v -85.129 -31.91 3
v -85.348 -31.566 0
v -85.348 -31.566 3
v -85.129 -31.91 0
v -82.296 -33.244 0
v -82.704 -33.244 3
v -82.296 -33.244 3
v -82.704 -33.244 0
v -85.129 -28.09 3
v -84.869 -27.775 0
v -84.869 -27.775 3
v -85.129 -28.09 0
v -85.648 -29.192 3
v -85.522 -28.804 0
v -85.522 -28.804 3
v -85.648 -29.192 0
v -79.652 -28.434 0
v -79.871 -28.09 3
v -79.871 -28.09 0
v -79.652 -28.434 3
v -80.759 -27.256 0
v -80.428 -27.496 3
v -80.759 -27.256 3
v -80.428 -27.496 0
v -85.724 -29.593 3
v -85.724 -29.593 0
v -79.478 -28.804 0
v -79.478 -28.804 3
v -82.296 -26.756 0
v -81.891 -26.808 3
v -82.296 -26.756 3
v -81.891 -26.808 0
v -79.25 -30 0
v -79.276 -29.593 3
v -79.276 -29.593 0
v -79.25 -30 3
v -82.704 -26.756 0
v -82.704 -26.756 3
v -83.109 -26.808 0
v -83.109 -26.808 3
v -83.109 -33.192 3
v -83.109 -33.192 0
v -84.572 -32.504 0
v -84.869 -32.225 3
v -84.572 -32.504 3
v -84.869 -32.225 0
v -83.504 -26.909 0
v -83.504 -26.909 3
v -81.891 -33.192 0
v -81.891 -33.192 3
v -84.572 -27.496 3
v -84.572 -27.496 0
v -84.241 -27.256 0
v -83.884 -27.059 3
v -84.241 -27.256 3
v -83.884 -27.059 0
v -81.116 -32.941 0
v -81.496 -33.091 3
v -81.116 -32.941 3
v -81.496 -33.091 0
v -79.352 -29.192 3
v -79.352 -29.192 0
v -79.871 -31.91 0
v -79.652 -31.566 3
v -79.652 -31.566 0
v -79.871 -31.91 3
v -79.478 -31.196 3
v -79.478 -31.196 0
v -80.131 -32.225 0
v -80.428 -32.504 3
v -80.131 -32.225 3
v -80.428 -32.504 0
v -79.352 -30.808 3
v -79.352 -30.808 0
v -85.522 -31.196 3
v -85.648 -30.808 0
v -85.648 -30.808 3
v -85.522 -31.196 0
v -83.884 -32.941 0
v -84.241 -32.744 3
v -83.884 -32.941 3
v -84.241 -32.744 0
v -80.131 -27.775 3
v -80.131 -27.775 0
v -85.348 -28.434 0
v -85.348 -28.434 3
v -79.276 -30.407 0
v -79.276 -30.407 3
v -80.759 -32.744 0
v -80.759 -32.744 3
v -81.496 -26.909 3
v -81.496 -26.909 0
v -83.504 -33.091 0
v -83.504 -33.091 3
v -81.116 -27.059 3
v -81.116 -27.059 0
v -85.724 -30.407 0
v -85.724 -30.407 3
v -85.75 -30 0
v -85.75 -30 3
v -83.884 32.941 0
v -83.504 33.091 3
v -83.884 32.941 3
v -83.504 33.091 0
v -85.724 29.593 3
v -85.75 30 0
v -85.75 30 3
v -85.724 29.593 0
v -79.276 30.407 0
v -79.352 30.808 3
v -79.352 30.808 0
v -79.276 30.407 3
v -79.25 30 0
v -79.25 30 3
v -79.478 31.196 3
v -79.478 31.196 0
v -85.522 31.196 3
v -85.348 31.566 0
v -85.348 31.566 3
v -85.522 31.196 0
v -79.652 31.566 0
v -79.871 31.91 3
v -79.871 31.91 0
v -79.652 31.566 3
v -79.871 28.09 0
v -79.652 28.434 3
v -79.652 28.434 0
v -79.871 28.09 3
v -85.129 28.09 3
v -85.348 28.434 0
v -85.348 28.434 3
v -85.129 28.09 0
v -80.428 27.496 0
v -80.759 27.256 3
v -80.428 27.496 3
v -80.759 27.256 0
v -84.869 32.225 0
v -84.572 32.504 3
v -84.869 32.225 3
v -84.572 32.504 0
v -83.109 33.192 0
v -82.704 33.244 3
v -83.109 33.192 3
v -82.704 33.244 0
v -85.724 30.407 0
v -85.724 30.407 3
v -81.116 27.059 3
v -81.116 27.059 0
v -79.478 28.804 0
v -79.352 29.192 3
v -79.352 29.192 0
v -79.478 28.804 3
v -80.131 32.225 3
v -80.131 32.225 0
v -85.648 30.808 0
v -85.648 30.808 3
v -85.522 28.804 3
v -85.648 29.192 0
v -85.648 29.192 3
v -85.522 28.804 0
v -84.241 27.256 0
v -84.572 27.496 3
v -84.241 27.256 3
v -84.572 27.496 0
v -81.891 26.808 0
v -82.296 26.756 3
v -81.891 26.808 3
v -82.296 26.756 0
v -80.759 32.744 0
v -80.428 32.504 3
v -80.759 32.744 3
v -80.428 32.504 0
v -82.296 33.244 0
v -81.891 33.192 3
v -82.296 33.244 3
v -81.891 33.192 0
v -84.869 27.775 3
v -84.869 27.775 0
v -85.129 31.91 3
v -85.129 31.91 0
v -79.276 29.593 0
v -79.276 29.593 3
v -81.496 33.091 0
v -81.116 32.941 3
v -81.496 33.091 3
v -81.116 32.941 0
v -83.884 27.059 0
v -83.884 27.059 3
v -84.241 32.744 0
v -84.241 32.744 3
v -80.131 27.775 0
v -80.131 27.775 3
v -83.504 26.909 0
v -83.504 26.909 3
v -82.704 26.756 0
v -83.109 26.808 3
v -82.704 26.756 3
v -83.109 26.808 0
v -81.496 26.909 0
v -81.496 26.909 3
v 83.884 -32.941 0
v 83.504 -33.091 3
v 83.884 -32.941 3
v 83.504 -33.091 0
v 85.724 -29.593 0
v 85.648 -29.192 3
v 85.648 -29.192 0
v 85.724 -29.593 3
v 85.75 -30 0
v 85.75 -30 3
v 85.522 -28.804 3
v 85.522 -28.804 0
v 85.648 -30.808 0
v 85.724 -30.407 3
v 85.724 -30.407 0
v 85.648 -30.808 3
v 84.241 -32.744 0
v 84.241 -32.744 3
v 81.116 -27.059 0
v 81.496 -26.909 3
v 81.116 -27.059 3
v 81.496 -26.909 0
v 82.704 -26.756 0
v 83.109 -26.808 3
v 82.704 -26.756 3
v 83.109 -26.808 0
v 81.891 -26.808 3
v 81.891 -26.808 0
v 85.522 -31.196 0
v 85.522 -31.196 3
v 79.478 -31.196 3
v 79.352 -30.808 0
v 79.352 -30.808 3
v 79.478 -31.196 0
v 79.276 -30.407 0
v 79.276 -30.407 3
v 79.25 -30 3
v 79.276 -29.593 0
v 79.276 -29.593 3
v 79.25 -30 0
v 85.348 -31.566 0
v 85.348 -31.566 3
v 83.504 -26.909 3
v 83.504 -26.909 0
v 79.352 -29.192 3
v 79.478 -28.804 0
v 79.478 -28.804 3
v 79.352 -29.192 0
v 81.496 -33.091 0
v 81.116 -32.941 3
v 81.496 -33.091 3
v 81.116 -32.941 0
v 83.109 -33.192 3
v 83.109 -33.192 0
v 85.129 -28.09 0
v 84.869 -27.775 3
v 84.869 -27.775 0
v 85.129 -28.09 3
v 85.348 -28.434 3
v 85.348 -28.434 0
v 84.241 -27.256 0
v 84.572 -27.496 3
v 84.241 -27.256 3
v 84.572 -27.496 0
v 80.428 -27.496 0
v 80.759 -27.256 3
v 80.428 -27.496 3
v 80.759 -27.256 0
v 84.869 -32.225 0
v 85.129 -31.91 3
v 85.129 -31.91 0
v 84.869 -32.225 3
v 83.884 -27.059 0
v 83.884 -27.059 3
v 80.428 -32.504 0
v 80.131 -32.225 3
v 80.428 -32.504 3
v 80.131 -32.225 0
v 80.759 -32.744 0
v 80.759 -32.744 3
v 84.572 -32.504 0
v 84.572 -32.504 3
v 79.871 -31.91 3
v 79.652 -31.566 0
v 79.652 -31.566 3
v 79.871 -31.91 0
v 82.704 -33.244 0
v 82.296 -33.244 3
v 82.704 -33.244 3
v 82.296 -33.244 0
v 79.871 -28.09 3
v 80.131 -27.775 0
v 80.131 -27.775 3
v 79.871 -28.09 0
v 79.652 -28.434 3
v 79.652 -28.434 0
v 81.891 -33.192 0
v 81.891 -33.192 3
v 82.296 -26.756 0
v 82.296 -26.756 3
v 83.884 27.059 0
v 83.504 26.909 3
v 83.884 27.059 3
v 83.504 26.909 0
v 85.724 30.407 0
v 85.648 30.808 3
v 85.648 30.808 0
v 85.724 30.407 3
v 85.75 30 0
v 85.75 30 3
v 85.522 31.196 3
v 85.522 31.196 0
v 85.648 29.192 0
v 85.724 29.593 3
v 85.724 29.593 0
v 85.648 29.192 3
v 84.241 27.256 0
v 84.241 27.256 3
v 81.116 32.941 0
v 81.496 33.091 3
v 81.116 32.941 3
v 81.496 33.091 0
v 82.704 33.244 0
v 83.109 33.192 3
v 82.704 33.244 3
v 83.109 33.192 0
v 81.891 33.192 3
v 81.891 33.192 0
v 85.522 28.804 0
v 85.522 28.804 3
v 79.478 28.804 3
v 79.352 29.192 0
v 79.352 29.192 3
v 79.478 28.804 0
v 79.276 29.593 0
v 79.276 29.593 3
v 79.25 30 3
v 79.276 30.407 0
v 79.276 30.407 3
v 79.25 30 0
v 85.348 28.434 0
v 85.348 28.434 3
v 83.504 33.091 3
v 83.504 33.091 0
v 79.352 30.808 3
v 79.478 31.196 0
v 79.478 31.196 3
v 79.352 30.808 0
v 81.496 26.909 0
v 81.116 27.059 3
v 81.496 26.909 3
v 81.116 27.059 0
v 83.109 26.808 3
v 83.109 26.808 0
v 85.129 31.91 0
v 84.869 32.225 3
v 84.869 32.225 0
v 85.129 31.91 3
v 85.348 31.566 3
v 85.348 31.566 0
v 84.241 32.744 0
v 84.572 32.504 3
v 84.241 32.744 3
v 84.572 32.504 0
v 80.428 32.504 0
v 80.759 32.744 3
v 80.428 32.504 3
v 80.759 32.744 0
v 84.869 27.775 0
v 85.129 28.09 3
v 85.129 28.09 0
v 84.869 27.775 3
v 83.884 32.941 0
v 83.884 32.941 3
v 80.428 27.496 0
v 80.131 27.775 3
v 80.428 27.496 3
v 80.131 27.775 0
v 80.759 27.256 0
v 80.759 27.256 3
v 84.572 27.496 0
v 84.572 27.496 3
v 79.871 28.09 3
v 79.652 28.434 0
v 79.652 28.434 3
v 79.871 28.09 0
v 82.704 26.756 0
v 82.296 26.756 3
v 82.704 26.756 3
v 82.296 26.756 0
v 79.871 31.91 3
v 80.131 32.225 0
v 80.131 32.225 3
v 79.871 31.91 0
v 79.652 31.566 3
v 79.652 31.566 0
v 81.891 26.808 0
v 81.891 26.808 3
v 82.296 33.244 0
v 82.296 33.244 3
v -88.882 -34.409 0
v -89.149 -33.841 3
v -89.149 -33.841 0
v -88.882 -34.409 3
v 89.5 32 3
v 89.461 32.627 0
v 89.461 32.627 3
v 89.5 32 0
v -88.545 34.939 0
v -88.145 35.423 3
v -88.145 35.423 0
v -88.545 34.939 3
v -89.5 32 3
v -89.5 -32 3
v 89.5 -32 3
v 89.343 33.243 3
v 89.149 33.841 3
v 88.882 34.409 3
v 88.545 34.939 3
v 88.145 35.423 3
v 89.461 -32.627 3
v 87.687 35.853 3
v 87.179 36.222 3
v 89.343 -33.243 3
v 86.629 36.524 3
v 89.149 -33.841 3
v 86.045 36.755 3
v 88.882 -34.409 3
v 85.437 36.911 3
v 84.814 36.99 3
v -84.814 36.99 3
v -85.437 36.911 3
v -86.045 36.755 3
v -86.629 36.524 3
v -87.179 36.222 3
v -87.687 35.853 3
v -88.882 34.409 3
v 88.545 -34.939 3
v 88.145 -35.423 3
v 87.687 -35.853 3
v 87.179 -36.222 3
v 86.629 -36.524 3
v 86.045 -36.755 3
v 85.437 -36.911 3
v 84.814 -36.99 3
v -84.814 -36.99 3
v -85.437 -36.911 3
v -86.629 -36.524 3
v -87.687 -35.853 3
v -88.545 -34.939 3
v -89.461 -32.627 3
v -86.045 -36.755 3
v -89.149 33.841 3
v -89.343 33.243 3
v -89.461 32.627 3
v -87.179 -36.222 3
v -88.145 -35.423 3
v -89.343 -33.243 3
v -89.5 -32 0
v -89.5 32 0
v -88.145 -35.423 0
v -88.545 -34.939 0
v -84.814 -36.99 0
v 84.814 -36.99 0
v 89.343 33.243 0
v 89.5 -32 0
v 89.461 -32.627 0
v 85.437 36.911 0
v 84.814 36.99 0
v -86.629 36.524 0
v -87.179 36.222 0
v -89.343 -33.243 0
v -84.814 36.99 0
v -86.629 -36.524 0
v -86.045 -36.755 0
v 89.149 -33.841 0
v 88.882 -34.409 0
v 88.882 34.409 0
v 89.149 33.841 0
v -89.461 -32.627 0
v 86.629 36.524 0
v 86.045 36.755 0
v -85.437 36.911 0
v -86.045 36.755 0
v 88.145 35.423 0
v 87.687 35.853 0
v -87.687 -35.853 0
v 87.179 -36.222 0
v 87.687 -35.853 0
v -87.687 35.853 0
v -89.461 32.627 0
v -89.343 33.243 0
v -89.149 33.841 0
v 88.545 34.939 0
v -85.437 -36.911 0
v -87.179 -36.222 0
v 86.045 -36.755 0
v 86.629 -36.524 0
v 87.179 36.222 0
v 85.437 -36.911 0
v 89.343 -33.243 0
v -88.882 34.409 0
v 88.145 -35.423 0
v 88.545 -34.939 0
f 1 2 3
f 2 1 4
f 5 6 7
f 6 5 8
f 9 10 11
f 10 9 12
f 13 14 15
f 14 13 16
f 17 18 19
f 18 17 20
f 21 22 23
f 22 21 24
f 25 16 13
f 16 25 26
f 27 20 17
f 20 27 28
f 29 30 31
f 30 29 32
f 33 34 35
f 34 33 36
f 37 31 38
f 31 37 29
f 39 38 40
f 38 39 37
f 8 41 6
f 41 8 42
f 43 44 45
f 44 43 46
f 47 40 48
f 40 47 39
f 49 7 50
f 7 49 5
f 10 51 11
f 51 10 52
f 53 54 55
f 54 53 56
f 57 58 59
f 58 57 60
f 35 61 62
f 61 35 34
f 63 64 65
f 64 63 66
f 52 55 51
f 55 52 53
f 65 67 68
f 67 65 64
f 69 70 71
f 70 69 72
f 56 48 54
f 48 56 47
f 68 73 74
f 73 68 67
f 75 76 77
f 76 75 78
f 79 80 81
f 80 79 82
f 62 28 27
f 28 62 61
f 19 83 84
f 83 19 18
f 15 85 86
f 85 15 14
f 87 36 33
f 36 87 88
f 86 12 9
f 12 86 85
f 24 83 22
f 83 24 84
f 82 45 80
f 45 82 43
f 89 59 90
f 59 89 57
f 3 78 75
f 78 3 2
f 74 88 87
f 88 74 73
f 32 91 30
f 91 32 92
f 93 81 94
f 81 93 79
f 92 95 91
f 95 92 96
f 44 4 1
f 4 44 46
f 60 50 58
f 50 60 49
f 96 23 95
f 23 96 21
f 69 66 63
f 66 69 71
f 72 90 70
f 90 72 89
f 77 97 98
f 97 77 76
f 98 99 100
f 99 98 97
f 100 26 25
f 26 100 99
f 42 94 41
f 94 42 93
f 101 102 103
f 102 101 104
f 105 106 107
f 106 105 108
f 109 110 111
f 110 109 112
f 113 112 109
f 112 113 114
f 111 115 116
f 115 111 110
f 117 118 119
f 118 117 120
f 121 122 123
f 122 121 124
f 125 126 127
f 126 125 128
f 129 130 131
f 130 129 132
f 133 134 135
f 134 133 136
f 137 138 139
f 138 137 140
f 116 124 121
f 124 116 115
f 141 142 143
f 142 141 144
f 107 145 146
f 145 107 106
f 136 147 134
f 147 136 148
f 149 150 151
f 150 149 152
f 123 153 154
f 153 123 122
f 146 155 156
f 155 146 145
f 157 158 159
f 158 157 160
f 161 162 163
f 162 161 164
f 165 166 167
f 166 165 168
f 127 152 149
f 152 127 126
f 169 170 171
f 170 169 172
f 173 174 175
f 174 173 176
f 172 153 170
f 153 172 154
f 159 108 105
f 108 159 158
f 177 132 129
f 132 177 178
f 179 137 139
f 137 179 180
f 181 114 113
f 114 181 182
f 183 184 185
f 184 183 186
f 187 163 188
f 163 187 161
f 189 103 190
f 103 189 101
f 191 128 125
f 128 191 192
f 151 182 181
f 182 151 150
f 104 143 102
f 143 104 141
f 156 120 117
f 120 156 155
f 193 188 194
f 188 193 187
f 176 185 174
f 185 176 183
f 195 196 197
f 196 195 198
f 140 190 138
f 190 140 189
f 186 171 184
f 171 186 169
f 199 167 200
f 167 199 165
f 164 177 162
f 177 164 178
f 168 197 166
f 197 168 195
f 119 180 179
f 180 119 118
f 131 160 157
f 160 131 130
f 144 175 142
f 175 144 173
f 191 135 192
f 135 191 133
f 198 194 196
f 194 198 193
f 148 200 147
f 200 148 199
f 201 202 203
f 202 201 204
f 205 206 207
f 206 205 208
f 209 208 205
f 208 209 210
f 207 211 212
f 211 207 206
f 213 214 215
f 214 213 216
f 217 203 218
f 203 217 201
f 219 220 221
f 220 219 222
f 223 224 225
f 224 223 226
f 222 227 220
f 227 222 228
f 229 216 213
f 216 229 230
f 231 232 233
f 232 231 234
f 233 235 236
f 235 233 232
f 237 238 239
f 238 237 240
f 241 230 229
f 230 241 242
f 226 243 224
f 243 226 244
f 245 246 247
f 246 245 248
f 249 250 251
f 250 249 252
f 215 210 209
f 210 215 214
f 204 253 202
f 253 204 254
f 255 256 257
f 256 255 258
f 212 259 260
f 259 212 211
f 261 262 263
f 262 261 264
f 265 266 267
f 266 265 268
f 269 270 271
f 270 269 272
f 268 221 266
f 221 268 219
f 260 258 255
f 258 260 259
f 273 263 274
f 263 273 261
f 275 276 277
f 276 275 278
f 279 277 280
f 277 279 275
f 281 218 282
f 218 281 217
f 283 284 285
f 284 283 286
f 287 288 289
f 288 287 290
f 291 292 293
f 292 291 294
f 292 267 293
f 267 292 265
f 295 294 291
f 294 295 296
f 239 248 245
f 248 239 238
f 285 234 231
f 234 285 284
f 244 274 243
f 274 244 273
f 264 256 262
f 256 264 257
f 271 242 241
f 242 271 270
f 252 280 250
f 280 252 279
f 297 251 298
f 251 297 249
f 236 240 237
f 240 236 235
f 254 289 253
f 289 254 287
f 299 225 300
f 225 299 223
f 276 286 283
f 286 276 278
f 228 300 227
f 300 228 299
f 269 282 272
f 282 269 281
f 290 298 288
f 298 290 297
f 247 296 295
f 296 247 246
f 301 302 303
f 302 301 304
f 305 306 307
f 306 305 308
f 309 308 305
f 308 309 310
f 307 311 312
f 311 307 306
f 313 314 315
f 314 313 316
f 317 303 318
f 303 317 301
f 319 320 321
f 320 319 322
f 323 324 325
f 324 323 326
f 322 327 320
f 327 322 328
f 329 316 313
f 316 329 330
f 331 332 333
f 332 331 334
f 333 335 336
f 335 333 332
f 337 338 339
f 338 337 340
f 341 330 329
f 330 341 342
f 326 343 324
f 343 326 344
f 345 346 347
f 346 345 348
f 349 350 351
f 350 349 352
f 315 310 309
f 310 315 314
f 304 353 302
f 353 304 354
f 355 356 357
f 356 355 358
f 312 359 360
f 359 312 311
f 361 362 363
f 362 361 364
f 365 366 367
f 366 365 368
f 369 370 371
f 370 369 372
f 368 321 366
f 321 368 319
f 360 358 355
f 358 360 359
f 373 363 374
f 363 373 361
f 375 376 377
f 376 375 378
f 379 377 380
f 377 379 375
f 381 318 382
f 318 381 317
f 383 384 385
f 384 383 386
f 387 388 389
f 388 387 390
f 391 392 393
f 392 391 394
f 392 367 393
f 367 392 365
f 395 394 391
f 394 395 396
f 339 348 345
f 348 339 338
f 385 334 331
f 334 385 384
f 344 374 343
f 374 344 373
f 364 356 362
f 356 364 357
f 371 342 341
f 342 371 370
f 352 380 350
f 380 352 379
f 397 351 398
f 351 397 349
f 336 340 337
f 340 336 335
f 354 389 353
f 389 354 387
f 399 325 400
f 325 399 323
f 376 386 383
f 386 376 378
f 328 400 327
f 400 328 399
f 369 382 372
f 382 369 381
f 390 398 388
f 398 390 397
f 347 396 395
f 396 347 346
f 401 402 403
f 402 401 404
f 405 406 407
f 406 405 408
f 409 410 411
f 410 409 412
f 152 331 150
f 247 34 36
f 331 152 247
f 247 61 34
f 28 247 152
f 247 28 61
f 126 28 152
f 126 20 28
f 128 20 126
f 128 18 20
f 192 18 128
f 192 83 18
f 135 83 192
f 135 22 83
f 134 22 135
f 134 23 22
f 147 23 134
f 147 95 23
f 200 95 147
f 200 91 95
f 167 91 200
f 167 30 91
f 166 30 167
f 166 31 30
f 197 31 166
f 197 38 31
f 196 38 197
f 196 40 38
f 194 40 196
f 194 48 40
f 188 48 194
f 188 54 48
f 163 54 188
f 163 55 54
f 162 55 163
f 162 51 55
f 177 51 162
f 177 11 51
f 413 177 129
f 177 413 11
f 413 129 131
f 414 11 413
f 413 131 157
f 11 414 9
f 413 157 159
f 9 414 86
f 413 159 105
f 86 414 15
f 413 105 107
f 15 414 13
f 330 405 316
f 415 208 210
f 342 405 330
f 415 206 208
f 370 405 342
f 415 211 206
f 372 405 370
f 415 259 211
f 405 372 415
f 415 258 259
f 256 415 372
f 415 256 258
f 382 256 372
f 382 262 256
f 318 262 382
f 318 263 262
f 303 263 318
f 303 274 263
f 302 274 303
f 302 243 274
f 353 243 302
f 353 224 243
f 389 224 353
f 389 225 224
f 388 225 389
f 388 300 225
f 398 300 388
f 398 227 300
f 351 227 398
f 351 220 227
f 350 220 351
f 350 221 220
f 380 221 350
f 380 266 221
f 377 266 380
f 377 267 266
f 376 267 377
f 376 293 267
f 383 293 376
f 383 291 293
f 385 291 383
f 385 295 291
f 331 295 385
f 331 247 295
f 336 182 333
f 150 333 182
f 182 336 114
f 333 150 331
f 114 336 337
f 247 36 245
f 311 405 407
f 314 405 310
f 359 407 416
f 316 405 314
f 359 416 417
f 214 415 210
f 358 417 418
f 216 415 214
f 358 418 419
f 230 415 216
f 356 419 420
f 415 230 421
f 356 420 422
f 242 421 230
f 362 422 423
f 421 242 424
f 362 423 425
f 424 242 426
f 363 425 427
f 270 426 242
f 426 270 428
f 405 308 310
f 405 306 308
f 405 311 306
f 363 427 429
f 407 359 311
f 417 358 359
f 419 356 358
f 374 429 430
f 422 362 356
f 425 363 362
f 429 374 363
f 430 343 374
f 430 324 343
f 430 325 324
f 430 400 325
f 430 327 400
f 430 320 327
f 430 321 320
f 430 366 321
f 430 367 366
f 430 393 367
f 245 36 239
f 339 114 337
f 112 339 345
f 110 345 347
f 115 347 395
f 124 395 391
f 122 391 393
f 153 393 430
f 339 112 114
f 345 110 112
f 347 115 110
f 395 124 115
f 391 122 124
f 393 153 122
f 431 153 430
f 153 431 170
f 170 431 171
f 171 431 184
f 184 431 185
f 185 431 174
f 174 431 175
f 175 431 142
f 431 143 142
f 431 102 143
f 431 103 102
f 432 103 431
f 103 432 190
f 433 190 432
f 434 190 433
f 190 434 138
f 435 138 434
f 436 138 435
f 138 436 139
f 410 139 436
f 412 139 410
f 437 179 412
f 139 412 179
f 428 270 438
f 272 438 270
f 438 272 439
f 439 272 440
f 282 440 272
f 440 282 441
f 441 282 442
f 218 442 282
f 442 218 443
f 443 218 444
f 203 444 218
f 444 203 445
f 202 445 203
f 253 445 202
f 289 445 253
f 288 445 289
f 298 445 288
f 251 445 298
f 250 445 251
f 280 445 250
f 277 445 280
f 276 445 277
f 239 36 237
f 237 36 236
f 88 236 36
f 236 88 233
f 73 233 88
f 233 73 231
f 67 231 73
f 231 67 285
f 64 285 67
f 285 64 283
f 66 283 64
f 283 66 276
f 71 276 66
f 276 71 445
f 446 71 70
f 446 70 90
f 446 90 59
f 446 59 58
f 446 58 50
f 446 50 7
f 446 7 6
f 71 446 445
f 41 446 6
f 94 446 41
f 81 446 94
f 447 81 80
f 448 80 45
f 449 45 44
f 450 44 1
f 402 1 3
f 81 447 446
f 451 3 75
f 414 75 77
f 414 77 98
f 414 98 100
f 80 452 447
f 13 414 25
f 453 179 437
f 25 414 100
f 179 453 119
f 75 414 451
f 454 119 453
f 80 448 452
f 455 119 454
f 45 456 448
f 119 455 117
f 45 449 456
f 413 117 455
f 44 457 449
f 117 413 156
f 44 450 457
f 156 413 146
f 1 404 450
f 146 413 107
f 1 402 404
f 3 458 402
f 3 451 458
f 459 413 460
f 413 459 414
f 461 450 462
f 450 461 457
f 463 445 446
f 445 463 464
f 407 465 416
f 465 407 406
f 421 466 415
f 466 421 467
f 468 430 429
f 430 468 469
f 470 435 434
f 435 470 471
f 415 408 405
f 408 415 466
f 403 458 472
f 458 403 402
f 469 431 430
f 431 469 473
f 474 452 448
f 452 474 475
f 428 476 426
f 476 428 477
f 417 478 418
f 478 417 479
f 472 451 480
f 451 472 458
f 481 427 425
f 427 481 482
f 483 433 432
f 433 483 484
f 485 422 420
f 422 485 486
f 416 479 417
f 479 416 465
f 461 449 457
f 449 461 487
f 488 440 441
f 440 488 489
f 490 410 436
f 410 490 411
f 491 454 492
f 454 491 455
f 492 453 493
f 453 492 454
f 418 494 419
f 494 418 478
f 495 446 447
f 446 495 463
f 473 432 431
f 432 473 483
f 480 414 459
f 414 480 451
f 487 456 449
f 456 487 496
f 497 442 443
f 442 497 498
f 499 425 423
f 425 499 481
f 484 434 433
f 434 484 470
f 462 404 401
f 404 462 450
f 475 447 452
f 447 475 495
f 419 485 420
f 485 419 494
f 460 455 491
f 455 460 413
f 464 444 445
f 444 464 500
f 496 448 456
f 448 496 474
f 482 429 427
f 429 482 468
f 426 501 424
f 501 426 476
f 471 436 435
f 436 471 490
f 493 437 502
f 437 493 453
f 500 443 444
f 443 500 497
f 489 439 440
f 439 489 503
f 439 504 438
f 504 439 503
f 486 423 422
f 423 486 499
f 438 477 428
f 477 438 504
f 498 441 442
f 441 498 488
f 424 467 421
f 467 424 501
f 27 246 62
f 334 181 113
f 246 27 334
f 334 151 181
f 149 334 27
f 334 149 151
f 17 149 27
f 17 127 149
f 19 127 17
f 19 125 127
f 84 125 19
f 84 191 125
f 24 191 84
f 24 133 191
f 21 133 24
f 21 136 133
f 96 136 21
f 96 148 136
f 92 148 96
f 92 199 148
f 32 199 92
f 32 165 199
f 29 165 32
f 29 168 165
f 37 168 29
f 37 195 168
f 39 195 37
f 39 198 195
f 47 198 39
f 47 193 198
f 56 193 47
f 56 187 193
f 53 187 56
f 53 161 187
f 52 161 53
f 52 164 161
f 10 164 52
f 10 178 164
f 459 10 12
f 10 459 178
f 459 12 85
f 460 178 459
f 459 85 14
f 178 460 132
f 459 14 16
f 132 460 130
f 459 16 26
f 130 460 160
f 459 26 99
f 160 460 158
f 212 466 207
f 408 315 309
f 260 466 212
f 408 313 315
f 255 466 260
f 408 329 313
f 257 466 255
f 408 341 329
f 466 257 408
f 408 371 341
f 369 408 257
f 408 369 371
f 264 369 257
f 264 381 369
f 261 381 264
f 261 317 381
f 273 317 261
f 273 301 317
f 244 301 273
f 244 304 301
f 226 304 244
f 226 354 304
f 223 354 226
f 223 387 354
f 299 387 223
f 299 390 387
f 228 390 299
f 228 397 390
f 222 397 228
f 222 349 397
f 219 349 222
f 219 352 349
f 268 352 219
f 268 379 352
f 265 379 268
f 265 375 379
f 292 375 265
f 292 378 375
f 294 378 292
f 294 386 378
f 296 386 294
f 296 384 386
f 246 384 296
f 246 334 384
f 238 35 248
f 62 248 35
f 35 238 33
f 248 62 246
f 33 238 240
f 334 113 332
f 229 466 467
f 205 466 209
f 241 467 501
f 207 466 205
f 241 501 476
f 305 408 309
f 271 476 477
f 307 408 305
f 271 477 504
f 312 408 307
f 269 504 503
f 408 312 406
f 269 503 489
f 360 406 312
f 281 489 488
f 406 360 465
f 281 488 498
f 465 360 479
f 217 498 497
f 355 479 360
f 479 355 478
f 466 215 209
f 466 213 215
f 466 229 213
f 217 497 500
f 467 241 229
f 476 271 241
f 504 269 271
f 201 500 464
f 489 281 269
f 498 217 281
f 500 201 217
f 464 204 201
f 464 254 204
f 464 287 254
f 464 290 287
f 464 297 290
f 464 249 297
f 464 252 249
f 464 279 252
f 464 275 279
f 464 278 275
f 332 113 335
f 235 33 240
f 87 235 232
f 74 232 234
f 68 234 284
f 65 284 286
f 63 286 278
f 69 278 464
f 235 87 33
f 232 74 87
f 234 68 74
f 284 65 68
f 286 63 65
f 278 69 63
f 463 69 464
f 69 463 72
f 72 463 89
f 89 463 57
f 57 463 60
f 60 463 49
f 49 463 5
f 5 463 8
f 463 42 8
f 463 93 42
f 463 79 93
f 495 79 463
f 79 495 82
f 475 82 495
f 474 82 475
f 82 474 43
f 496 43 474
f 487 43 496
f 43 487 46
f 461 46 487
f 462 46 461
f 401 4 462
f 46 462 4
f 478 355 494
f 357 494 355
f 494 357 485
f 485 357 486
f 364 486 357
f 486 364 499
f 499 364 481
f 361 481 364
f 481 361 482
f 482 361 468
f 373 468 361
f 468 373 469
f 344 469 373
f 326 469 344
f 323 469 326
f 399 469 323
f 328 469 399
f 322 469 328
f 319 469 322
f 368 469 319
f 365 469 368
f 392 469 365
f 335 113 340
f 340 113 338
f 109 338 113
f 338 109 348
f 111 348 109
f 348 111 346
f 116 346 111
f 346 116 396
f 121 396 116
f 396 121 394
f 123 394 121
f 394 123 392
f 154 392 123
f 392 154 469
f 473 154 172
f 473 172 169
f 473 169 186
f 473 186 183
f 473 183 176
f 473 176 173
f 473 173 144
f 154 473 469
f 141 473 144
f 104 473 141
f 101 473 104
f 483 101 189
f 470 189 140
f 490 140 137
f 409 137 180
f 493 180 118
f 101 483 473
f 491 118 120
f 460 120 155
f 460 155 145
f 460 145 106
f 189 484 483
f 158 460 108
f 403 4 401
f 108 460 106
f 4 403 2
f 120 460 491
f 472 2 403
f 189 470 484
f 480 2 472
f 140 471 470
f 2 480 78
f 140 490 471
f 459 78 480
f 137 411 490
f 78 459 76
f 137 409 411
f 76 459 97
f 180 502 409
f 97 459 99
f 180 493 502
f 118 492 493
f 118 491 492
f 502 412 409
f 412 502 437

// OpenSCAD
$fn = 50;


difference() {
	union() {
		hull() {
			translate(v = [-84.5000000000, 32.0000000000, 0]) {
				cylinder(h = 3, r = 5);
			}
			translate(v = [84.5000000000, 32.0000000000, 0]) {
				cylinder(h = 3, r = 5);
			}
			translate(v = [-84.5000000000, -32.0000000000, 0]) {
				cylinder(h = 3, r = 5);
			}
			translate(v = [84.5000000000, -32.0000000000, 0]) {
				cylinder(h = 3, r = 5);
			}
		}
	}
	union() {
		translate(v = [-82.5000000000, -30.0000000000, -100.0000000000]) {
			cylinder(h = 200, r = 3.2500000000);
		}
		translate(v = [-82.5000000000, 30.0000000000, -100.0000000000]) {
			cylinder(h = 200, r = 3.2500000000);
		}
		translate(v = [82.5000000000, -30.0000000000, -100.0000000000]) {
			cylinder(h = 200, r = 3.2500000000);
		}
		translate(v = [82.5000000000, 30.0000000000, -100.0000000000]) {
			cylinder(h = 200, r = 3.2500000000);
		}
	}
}
